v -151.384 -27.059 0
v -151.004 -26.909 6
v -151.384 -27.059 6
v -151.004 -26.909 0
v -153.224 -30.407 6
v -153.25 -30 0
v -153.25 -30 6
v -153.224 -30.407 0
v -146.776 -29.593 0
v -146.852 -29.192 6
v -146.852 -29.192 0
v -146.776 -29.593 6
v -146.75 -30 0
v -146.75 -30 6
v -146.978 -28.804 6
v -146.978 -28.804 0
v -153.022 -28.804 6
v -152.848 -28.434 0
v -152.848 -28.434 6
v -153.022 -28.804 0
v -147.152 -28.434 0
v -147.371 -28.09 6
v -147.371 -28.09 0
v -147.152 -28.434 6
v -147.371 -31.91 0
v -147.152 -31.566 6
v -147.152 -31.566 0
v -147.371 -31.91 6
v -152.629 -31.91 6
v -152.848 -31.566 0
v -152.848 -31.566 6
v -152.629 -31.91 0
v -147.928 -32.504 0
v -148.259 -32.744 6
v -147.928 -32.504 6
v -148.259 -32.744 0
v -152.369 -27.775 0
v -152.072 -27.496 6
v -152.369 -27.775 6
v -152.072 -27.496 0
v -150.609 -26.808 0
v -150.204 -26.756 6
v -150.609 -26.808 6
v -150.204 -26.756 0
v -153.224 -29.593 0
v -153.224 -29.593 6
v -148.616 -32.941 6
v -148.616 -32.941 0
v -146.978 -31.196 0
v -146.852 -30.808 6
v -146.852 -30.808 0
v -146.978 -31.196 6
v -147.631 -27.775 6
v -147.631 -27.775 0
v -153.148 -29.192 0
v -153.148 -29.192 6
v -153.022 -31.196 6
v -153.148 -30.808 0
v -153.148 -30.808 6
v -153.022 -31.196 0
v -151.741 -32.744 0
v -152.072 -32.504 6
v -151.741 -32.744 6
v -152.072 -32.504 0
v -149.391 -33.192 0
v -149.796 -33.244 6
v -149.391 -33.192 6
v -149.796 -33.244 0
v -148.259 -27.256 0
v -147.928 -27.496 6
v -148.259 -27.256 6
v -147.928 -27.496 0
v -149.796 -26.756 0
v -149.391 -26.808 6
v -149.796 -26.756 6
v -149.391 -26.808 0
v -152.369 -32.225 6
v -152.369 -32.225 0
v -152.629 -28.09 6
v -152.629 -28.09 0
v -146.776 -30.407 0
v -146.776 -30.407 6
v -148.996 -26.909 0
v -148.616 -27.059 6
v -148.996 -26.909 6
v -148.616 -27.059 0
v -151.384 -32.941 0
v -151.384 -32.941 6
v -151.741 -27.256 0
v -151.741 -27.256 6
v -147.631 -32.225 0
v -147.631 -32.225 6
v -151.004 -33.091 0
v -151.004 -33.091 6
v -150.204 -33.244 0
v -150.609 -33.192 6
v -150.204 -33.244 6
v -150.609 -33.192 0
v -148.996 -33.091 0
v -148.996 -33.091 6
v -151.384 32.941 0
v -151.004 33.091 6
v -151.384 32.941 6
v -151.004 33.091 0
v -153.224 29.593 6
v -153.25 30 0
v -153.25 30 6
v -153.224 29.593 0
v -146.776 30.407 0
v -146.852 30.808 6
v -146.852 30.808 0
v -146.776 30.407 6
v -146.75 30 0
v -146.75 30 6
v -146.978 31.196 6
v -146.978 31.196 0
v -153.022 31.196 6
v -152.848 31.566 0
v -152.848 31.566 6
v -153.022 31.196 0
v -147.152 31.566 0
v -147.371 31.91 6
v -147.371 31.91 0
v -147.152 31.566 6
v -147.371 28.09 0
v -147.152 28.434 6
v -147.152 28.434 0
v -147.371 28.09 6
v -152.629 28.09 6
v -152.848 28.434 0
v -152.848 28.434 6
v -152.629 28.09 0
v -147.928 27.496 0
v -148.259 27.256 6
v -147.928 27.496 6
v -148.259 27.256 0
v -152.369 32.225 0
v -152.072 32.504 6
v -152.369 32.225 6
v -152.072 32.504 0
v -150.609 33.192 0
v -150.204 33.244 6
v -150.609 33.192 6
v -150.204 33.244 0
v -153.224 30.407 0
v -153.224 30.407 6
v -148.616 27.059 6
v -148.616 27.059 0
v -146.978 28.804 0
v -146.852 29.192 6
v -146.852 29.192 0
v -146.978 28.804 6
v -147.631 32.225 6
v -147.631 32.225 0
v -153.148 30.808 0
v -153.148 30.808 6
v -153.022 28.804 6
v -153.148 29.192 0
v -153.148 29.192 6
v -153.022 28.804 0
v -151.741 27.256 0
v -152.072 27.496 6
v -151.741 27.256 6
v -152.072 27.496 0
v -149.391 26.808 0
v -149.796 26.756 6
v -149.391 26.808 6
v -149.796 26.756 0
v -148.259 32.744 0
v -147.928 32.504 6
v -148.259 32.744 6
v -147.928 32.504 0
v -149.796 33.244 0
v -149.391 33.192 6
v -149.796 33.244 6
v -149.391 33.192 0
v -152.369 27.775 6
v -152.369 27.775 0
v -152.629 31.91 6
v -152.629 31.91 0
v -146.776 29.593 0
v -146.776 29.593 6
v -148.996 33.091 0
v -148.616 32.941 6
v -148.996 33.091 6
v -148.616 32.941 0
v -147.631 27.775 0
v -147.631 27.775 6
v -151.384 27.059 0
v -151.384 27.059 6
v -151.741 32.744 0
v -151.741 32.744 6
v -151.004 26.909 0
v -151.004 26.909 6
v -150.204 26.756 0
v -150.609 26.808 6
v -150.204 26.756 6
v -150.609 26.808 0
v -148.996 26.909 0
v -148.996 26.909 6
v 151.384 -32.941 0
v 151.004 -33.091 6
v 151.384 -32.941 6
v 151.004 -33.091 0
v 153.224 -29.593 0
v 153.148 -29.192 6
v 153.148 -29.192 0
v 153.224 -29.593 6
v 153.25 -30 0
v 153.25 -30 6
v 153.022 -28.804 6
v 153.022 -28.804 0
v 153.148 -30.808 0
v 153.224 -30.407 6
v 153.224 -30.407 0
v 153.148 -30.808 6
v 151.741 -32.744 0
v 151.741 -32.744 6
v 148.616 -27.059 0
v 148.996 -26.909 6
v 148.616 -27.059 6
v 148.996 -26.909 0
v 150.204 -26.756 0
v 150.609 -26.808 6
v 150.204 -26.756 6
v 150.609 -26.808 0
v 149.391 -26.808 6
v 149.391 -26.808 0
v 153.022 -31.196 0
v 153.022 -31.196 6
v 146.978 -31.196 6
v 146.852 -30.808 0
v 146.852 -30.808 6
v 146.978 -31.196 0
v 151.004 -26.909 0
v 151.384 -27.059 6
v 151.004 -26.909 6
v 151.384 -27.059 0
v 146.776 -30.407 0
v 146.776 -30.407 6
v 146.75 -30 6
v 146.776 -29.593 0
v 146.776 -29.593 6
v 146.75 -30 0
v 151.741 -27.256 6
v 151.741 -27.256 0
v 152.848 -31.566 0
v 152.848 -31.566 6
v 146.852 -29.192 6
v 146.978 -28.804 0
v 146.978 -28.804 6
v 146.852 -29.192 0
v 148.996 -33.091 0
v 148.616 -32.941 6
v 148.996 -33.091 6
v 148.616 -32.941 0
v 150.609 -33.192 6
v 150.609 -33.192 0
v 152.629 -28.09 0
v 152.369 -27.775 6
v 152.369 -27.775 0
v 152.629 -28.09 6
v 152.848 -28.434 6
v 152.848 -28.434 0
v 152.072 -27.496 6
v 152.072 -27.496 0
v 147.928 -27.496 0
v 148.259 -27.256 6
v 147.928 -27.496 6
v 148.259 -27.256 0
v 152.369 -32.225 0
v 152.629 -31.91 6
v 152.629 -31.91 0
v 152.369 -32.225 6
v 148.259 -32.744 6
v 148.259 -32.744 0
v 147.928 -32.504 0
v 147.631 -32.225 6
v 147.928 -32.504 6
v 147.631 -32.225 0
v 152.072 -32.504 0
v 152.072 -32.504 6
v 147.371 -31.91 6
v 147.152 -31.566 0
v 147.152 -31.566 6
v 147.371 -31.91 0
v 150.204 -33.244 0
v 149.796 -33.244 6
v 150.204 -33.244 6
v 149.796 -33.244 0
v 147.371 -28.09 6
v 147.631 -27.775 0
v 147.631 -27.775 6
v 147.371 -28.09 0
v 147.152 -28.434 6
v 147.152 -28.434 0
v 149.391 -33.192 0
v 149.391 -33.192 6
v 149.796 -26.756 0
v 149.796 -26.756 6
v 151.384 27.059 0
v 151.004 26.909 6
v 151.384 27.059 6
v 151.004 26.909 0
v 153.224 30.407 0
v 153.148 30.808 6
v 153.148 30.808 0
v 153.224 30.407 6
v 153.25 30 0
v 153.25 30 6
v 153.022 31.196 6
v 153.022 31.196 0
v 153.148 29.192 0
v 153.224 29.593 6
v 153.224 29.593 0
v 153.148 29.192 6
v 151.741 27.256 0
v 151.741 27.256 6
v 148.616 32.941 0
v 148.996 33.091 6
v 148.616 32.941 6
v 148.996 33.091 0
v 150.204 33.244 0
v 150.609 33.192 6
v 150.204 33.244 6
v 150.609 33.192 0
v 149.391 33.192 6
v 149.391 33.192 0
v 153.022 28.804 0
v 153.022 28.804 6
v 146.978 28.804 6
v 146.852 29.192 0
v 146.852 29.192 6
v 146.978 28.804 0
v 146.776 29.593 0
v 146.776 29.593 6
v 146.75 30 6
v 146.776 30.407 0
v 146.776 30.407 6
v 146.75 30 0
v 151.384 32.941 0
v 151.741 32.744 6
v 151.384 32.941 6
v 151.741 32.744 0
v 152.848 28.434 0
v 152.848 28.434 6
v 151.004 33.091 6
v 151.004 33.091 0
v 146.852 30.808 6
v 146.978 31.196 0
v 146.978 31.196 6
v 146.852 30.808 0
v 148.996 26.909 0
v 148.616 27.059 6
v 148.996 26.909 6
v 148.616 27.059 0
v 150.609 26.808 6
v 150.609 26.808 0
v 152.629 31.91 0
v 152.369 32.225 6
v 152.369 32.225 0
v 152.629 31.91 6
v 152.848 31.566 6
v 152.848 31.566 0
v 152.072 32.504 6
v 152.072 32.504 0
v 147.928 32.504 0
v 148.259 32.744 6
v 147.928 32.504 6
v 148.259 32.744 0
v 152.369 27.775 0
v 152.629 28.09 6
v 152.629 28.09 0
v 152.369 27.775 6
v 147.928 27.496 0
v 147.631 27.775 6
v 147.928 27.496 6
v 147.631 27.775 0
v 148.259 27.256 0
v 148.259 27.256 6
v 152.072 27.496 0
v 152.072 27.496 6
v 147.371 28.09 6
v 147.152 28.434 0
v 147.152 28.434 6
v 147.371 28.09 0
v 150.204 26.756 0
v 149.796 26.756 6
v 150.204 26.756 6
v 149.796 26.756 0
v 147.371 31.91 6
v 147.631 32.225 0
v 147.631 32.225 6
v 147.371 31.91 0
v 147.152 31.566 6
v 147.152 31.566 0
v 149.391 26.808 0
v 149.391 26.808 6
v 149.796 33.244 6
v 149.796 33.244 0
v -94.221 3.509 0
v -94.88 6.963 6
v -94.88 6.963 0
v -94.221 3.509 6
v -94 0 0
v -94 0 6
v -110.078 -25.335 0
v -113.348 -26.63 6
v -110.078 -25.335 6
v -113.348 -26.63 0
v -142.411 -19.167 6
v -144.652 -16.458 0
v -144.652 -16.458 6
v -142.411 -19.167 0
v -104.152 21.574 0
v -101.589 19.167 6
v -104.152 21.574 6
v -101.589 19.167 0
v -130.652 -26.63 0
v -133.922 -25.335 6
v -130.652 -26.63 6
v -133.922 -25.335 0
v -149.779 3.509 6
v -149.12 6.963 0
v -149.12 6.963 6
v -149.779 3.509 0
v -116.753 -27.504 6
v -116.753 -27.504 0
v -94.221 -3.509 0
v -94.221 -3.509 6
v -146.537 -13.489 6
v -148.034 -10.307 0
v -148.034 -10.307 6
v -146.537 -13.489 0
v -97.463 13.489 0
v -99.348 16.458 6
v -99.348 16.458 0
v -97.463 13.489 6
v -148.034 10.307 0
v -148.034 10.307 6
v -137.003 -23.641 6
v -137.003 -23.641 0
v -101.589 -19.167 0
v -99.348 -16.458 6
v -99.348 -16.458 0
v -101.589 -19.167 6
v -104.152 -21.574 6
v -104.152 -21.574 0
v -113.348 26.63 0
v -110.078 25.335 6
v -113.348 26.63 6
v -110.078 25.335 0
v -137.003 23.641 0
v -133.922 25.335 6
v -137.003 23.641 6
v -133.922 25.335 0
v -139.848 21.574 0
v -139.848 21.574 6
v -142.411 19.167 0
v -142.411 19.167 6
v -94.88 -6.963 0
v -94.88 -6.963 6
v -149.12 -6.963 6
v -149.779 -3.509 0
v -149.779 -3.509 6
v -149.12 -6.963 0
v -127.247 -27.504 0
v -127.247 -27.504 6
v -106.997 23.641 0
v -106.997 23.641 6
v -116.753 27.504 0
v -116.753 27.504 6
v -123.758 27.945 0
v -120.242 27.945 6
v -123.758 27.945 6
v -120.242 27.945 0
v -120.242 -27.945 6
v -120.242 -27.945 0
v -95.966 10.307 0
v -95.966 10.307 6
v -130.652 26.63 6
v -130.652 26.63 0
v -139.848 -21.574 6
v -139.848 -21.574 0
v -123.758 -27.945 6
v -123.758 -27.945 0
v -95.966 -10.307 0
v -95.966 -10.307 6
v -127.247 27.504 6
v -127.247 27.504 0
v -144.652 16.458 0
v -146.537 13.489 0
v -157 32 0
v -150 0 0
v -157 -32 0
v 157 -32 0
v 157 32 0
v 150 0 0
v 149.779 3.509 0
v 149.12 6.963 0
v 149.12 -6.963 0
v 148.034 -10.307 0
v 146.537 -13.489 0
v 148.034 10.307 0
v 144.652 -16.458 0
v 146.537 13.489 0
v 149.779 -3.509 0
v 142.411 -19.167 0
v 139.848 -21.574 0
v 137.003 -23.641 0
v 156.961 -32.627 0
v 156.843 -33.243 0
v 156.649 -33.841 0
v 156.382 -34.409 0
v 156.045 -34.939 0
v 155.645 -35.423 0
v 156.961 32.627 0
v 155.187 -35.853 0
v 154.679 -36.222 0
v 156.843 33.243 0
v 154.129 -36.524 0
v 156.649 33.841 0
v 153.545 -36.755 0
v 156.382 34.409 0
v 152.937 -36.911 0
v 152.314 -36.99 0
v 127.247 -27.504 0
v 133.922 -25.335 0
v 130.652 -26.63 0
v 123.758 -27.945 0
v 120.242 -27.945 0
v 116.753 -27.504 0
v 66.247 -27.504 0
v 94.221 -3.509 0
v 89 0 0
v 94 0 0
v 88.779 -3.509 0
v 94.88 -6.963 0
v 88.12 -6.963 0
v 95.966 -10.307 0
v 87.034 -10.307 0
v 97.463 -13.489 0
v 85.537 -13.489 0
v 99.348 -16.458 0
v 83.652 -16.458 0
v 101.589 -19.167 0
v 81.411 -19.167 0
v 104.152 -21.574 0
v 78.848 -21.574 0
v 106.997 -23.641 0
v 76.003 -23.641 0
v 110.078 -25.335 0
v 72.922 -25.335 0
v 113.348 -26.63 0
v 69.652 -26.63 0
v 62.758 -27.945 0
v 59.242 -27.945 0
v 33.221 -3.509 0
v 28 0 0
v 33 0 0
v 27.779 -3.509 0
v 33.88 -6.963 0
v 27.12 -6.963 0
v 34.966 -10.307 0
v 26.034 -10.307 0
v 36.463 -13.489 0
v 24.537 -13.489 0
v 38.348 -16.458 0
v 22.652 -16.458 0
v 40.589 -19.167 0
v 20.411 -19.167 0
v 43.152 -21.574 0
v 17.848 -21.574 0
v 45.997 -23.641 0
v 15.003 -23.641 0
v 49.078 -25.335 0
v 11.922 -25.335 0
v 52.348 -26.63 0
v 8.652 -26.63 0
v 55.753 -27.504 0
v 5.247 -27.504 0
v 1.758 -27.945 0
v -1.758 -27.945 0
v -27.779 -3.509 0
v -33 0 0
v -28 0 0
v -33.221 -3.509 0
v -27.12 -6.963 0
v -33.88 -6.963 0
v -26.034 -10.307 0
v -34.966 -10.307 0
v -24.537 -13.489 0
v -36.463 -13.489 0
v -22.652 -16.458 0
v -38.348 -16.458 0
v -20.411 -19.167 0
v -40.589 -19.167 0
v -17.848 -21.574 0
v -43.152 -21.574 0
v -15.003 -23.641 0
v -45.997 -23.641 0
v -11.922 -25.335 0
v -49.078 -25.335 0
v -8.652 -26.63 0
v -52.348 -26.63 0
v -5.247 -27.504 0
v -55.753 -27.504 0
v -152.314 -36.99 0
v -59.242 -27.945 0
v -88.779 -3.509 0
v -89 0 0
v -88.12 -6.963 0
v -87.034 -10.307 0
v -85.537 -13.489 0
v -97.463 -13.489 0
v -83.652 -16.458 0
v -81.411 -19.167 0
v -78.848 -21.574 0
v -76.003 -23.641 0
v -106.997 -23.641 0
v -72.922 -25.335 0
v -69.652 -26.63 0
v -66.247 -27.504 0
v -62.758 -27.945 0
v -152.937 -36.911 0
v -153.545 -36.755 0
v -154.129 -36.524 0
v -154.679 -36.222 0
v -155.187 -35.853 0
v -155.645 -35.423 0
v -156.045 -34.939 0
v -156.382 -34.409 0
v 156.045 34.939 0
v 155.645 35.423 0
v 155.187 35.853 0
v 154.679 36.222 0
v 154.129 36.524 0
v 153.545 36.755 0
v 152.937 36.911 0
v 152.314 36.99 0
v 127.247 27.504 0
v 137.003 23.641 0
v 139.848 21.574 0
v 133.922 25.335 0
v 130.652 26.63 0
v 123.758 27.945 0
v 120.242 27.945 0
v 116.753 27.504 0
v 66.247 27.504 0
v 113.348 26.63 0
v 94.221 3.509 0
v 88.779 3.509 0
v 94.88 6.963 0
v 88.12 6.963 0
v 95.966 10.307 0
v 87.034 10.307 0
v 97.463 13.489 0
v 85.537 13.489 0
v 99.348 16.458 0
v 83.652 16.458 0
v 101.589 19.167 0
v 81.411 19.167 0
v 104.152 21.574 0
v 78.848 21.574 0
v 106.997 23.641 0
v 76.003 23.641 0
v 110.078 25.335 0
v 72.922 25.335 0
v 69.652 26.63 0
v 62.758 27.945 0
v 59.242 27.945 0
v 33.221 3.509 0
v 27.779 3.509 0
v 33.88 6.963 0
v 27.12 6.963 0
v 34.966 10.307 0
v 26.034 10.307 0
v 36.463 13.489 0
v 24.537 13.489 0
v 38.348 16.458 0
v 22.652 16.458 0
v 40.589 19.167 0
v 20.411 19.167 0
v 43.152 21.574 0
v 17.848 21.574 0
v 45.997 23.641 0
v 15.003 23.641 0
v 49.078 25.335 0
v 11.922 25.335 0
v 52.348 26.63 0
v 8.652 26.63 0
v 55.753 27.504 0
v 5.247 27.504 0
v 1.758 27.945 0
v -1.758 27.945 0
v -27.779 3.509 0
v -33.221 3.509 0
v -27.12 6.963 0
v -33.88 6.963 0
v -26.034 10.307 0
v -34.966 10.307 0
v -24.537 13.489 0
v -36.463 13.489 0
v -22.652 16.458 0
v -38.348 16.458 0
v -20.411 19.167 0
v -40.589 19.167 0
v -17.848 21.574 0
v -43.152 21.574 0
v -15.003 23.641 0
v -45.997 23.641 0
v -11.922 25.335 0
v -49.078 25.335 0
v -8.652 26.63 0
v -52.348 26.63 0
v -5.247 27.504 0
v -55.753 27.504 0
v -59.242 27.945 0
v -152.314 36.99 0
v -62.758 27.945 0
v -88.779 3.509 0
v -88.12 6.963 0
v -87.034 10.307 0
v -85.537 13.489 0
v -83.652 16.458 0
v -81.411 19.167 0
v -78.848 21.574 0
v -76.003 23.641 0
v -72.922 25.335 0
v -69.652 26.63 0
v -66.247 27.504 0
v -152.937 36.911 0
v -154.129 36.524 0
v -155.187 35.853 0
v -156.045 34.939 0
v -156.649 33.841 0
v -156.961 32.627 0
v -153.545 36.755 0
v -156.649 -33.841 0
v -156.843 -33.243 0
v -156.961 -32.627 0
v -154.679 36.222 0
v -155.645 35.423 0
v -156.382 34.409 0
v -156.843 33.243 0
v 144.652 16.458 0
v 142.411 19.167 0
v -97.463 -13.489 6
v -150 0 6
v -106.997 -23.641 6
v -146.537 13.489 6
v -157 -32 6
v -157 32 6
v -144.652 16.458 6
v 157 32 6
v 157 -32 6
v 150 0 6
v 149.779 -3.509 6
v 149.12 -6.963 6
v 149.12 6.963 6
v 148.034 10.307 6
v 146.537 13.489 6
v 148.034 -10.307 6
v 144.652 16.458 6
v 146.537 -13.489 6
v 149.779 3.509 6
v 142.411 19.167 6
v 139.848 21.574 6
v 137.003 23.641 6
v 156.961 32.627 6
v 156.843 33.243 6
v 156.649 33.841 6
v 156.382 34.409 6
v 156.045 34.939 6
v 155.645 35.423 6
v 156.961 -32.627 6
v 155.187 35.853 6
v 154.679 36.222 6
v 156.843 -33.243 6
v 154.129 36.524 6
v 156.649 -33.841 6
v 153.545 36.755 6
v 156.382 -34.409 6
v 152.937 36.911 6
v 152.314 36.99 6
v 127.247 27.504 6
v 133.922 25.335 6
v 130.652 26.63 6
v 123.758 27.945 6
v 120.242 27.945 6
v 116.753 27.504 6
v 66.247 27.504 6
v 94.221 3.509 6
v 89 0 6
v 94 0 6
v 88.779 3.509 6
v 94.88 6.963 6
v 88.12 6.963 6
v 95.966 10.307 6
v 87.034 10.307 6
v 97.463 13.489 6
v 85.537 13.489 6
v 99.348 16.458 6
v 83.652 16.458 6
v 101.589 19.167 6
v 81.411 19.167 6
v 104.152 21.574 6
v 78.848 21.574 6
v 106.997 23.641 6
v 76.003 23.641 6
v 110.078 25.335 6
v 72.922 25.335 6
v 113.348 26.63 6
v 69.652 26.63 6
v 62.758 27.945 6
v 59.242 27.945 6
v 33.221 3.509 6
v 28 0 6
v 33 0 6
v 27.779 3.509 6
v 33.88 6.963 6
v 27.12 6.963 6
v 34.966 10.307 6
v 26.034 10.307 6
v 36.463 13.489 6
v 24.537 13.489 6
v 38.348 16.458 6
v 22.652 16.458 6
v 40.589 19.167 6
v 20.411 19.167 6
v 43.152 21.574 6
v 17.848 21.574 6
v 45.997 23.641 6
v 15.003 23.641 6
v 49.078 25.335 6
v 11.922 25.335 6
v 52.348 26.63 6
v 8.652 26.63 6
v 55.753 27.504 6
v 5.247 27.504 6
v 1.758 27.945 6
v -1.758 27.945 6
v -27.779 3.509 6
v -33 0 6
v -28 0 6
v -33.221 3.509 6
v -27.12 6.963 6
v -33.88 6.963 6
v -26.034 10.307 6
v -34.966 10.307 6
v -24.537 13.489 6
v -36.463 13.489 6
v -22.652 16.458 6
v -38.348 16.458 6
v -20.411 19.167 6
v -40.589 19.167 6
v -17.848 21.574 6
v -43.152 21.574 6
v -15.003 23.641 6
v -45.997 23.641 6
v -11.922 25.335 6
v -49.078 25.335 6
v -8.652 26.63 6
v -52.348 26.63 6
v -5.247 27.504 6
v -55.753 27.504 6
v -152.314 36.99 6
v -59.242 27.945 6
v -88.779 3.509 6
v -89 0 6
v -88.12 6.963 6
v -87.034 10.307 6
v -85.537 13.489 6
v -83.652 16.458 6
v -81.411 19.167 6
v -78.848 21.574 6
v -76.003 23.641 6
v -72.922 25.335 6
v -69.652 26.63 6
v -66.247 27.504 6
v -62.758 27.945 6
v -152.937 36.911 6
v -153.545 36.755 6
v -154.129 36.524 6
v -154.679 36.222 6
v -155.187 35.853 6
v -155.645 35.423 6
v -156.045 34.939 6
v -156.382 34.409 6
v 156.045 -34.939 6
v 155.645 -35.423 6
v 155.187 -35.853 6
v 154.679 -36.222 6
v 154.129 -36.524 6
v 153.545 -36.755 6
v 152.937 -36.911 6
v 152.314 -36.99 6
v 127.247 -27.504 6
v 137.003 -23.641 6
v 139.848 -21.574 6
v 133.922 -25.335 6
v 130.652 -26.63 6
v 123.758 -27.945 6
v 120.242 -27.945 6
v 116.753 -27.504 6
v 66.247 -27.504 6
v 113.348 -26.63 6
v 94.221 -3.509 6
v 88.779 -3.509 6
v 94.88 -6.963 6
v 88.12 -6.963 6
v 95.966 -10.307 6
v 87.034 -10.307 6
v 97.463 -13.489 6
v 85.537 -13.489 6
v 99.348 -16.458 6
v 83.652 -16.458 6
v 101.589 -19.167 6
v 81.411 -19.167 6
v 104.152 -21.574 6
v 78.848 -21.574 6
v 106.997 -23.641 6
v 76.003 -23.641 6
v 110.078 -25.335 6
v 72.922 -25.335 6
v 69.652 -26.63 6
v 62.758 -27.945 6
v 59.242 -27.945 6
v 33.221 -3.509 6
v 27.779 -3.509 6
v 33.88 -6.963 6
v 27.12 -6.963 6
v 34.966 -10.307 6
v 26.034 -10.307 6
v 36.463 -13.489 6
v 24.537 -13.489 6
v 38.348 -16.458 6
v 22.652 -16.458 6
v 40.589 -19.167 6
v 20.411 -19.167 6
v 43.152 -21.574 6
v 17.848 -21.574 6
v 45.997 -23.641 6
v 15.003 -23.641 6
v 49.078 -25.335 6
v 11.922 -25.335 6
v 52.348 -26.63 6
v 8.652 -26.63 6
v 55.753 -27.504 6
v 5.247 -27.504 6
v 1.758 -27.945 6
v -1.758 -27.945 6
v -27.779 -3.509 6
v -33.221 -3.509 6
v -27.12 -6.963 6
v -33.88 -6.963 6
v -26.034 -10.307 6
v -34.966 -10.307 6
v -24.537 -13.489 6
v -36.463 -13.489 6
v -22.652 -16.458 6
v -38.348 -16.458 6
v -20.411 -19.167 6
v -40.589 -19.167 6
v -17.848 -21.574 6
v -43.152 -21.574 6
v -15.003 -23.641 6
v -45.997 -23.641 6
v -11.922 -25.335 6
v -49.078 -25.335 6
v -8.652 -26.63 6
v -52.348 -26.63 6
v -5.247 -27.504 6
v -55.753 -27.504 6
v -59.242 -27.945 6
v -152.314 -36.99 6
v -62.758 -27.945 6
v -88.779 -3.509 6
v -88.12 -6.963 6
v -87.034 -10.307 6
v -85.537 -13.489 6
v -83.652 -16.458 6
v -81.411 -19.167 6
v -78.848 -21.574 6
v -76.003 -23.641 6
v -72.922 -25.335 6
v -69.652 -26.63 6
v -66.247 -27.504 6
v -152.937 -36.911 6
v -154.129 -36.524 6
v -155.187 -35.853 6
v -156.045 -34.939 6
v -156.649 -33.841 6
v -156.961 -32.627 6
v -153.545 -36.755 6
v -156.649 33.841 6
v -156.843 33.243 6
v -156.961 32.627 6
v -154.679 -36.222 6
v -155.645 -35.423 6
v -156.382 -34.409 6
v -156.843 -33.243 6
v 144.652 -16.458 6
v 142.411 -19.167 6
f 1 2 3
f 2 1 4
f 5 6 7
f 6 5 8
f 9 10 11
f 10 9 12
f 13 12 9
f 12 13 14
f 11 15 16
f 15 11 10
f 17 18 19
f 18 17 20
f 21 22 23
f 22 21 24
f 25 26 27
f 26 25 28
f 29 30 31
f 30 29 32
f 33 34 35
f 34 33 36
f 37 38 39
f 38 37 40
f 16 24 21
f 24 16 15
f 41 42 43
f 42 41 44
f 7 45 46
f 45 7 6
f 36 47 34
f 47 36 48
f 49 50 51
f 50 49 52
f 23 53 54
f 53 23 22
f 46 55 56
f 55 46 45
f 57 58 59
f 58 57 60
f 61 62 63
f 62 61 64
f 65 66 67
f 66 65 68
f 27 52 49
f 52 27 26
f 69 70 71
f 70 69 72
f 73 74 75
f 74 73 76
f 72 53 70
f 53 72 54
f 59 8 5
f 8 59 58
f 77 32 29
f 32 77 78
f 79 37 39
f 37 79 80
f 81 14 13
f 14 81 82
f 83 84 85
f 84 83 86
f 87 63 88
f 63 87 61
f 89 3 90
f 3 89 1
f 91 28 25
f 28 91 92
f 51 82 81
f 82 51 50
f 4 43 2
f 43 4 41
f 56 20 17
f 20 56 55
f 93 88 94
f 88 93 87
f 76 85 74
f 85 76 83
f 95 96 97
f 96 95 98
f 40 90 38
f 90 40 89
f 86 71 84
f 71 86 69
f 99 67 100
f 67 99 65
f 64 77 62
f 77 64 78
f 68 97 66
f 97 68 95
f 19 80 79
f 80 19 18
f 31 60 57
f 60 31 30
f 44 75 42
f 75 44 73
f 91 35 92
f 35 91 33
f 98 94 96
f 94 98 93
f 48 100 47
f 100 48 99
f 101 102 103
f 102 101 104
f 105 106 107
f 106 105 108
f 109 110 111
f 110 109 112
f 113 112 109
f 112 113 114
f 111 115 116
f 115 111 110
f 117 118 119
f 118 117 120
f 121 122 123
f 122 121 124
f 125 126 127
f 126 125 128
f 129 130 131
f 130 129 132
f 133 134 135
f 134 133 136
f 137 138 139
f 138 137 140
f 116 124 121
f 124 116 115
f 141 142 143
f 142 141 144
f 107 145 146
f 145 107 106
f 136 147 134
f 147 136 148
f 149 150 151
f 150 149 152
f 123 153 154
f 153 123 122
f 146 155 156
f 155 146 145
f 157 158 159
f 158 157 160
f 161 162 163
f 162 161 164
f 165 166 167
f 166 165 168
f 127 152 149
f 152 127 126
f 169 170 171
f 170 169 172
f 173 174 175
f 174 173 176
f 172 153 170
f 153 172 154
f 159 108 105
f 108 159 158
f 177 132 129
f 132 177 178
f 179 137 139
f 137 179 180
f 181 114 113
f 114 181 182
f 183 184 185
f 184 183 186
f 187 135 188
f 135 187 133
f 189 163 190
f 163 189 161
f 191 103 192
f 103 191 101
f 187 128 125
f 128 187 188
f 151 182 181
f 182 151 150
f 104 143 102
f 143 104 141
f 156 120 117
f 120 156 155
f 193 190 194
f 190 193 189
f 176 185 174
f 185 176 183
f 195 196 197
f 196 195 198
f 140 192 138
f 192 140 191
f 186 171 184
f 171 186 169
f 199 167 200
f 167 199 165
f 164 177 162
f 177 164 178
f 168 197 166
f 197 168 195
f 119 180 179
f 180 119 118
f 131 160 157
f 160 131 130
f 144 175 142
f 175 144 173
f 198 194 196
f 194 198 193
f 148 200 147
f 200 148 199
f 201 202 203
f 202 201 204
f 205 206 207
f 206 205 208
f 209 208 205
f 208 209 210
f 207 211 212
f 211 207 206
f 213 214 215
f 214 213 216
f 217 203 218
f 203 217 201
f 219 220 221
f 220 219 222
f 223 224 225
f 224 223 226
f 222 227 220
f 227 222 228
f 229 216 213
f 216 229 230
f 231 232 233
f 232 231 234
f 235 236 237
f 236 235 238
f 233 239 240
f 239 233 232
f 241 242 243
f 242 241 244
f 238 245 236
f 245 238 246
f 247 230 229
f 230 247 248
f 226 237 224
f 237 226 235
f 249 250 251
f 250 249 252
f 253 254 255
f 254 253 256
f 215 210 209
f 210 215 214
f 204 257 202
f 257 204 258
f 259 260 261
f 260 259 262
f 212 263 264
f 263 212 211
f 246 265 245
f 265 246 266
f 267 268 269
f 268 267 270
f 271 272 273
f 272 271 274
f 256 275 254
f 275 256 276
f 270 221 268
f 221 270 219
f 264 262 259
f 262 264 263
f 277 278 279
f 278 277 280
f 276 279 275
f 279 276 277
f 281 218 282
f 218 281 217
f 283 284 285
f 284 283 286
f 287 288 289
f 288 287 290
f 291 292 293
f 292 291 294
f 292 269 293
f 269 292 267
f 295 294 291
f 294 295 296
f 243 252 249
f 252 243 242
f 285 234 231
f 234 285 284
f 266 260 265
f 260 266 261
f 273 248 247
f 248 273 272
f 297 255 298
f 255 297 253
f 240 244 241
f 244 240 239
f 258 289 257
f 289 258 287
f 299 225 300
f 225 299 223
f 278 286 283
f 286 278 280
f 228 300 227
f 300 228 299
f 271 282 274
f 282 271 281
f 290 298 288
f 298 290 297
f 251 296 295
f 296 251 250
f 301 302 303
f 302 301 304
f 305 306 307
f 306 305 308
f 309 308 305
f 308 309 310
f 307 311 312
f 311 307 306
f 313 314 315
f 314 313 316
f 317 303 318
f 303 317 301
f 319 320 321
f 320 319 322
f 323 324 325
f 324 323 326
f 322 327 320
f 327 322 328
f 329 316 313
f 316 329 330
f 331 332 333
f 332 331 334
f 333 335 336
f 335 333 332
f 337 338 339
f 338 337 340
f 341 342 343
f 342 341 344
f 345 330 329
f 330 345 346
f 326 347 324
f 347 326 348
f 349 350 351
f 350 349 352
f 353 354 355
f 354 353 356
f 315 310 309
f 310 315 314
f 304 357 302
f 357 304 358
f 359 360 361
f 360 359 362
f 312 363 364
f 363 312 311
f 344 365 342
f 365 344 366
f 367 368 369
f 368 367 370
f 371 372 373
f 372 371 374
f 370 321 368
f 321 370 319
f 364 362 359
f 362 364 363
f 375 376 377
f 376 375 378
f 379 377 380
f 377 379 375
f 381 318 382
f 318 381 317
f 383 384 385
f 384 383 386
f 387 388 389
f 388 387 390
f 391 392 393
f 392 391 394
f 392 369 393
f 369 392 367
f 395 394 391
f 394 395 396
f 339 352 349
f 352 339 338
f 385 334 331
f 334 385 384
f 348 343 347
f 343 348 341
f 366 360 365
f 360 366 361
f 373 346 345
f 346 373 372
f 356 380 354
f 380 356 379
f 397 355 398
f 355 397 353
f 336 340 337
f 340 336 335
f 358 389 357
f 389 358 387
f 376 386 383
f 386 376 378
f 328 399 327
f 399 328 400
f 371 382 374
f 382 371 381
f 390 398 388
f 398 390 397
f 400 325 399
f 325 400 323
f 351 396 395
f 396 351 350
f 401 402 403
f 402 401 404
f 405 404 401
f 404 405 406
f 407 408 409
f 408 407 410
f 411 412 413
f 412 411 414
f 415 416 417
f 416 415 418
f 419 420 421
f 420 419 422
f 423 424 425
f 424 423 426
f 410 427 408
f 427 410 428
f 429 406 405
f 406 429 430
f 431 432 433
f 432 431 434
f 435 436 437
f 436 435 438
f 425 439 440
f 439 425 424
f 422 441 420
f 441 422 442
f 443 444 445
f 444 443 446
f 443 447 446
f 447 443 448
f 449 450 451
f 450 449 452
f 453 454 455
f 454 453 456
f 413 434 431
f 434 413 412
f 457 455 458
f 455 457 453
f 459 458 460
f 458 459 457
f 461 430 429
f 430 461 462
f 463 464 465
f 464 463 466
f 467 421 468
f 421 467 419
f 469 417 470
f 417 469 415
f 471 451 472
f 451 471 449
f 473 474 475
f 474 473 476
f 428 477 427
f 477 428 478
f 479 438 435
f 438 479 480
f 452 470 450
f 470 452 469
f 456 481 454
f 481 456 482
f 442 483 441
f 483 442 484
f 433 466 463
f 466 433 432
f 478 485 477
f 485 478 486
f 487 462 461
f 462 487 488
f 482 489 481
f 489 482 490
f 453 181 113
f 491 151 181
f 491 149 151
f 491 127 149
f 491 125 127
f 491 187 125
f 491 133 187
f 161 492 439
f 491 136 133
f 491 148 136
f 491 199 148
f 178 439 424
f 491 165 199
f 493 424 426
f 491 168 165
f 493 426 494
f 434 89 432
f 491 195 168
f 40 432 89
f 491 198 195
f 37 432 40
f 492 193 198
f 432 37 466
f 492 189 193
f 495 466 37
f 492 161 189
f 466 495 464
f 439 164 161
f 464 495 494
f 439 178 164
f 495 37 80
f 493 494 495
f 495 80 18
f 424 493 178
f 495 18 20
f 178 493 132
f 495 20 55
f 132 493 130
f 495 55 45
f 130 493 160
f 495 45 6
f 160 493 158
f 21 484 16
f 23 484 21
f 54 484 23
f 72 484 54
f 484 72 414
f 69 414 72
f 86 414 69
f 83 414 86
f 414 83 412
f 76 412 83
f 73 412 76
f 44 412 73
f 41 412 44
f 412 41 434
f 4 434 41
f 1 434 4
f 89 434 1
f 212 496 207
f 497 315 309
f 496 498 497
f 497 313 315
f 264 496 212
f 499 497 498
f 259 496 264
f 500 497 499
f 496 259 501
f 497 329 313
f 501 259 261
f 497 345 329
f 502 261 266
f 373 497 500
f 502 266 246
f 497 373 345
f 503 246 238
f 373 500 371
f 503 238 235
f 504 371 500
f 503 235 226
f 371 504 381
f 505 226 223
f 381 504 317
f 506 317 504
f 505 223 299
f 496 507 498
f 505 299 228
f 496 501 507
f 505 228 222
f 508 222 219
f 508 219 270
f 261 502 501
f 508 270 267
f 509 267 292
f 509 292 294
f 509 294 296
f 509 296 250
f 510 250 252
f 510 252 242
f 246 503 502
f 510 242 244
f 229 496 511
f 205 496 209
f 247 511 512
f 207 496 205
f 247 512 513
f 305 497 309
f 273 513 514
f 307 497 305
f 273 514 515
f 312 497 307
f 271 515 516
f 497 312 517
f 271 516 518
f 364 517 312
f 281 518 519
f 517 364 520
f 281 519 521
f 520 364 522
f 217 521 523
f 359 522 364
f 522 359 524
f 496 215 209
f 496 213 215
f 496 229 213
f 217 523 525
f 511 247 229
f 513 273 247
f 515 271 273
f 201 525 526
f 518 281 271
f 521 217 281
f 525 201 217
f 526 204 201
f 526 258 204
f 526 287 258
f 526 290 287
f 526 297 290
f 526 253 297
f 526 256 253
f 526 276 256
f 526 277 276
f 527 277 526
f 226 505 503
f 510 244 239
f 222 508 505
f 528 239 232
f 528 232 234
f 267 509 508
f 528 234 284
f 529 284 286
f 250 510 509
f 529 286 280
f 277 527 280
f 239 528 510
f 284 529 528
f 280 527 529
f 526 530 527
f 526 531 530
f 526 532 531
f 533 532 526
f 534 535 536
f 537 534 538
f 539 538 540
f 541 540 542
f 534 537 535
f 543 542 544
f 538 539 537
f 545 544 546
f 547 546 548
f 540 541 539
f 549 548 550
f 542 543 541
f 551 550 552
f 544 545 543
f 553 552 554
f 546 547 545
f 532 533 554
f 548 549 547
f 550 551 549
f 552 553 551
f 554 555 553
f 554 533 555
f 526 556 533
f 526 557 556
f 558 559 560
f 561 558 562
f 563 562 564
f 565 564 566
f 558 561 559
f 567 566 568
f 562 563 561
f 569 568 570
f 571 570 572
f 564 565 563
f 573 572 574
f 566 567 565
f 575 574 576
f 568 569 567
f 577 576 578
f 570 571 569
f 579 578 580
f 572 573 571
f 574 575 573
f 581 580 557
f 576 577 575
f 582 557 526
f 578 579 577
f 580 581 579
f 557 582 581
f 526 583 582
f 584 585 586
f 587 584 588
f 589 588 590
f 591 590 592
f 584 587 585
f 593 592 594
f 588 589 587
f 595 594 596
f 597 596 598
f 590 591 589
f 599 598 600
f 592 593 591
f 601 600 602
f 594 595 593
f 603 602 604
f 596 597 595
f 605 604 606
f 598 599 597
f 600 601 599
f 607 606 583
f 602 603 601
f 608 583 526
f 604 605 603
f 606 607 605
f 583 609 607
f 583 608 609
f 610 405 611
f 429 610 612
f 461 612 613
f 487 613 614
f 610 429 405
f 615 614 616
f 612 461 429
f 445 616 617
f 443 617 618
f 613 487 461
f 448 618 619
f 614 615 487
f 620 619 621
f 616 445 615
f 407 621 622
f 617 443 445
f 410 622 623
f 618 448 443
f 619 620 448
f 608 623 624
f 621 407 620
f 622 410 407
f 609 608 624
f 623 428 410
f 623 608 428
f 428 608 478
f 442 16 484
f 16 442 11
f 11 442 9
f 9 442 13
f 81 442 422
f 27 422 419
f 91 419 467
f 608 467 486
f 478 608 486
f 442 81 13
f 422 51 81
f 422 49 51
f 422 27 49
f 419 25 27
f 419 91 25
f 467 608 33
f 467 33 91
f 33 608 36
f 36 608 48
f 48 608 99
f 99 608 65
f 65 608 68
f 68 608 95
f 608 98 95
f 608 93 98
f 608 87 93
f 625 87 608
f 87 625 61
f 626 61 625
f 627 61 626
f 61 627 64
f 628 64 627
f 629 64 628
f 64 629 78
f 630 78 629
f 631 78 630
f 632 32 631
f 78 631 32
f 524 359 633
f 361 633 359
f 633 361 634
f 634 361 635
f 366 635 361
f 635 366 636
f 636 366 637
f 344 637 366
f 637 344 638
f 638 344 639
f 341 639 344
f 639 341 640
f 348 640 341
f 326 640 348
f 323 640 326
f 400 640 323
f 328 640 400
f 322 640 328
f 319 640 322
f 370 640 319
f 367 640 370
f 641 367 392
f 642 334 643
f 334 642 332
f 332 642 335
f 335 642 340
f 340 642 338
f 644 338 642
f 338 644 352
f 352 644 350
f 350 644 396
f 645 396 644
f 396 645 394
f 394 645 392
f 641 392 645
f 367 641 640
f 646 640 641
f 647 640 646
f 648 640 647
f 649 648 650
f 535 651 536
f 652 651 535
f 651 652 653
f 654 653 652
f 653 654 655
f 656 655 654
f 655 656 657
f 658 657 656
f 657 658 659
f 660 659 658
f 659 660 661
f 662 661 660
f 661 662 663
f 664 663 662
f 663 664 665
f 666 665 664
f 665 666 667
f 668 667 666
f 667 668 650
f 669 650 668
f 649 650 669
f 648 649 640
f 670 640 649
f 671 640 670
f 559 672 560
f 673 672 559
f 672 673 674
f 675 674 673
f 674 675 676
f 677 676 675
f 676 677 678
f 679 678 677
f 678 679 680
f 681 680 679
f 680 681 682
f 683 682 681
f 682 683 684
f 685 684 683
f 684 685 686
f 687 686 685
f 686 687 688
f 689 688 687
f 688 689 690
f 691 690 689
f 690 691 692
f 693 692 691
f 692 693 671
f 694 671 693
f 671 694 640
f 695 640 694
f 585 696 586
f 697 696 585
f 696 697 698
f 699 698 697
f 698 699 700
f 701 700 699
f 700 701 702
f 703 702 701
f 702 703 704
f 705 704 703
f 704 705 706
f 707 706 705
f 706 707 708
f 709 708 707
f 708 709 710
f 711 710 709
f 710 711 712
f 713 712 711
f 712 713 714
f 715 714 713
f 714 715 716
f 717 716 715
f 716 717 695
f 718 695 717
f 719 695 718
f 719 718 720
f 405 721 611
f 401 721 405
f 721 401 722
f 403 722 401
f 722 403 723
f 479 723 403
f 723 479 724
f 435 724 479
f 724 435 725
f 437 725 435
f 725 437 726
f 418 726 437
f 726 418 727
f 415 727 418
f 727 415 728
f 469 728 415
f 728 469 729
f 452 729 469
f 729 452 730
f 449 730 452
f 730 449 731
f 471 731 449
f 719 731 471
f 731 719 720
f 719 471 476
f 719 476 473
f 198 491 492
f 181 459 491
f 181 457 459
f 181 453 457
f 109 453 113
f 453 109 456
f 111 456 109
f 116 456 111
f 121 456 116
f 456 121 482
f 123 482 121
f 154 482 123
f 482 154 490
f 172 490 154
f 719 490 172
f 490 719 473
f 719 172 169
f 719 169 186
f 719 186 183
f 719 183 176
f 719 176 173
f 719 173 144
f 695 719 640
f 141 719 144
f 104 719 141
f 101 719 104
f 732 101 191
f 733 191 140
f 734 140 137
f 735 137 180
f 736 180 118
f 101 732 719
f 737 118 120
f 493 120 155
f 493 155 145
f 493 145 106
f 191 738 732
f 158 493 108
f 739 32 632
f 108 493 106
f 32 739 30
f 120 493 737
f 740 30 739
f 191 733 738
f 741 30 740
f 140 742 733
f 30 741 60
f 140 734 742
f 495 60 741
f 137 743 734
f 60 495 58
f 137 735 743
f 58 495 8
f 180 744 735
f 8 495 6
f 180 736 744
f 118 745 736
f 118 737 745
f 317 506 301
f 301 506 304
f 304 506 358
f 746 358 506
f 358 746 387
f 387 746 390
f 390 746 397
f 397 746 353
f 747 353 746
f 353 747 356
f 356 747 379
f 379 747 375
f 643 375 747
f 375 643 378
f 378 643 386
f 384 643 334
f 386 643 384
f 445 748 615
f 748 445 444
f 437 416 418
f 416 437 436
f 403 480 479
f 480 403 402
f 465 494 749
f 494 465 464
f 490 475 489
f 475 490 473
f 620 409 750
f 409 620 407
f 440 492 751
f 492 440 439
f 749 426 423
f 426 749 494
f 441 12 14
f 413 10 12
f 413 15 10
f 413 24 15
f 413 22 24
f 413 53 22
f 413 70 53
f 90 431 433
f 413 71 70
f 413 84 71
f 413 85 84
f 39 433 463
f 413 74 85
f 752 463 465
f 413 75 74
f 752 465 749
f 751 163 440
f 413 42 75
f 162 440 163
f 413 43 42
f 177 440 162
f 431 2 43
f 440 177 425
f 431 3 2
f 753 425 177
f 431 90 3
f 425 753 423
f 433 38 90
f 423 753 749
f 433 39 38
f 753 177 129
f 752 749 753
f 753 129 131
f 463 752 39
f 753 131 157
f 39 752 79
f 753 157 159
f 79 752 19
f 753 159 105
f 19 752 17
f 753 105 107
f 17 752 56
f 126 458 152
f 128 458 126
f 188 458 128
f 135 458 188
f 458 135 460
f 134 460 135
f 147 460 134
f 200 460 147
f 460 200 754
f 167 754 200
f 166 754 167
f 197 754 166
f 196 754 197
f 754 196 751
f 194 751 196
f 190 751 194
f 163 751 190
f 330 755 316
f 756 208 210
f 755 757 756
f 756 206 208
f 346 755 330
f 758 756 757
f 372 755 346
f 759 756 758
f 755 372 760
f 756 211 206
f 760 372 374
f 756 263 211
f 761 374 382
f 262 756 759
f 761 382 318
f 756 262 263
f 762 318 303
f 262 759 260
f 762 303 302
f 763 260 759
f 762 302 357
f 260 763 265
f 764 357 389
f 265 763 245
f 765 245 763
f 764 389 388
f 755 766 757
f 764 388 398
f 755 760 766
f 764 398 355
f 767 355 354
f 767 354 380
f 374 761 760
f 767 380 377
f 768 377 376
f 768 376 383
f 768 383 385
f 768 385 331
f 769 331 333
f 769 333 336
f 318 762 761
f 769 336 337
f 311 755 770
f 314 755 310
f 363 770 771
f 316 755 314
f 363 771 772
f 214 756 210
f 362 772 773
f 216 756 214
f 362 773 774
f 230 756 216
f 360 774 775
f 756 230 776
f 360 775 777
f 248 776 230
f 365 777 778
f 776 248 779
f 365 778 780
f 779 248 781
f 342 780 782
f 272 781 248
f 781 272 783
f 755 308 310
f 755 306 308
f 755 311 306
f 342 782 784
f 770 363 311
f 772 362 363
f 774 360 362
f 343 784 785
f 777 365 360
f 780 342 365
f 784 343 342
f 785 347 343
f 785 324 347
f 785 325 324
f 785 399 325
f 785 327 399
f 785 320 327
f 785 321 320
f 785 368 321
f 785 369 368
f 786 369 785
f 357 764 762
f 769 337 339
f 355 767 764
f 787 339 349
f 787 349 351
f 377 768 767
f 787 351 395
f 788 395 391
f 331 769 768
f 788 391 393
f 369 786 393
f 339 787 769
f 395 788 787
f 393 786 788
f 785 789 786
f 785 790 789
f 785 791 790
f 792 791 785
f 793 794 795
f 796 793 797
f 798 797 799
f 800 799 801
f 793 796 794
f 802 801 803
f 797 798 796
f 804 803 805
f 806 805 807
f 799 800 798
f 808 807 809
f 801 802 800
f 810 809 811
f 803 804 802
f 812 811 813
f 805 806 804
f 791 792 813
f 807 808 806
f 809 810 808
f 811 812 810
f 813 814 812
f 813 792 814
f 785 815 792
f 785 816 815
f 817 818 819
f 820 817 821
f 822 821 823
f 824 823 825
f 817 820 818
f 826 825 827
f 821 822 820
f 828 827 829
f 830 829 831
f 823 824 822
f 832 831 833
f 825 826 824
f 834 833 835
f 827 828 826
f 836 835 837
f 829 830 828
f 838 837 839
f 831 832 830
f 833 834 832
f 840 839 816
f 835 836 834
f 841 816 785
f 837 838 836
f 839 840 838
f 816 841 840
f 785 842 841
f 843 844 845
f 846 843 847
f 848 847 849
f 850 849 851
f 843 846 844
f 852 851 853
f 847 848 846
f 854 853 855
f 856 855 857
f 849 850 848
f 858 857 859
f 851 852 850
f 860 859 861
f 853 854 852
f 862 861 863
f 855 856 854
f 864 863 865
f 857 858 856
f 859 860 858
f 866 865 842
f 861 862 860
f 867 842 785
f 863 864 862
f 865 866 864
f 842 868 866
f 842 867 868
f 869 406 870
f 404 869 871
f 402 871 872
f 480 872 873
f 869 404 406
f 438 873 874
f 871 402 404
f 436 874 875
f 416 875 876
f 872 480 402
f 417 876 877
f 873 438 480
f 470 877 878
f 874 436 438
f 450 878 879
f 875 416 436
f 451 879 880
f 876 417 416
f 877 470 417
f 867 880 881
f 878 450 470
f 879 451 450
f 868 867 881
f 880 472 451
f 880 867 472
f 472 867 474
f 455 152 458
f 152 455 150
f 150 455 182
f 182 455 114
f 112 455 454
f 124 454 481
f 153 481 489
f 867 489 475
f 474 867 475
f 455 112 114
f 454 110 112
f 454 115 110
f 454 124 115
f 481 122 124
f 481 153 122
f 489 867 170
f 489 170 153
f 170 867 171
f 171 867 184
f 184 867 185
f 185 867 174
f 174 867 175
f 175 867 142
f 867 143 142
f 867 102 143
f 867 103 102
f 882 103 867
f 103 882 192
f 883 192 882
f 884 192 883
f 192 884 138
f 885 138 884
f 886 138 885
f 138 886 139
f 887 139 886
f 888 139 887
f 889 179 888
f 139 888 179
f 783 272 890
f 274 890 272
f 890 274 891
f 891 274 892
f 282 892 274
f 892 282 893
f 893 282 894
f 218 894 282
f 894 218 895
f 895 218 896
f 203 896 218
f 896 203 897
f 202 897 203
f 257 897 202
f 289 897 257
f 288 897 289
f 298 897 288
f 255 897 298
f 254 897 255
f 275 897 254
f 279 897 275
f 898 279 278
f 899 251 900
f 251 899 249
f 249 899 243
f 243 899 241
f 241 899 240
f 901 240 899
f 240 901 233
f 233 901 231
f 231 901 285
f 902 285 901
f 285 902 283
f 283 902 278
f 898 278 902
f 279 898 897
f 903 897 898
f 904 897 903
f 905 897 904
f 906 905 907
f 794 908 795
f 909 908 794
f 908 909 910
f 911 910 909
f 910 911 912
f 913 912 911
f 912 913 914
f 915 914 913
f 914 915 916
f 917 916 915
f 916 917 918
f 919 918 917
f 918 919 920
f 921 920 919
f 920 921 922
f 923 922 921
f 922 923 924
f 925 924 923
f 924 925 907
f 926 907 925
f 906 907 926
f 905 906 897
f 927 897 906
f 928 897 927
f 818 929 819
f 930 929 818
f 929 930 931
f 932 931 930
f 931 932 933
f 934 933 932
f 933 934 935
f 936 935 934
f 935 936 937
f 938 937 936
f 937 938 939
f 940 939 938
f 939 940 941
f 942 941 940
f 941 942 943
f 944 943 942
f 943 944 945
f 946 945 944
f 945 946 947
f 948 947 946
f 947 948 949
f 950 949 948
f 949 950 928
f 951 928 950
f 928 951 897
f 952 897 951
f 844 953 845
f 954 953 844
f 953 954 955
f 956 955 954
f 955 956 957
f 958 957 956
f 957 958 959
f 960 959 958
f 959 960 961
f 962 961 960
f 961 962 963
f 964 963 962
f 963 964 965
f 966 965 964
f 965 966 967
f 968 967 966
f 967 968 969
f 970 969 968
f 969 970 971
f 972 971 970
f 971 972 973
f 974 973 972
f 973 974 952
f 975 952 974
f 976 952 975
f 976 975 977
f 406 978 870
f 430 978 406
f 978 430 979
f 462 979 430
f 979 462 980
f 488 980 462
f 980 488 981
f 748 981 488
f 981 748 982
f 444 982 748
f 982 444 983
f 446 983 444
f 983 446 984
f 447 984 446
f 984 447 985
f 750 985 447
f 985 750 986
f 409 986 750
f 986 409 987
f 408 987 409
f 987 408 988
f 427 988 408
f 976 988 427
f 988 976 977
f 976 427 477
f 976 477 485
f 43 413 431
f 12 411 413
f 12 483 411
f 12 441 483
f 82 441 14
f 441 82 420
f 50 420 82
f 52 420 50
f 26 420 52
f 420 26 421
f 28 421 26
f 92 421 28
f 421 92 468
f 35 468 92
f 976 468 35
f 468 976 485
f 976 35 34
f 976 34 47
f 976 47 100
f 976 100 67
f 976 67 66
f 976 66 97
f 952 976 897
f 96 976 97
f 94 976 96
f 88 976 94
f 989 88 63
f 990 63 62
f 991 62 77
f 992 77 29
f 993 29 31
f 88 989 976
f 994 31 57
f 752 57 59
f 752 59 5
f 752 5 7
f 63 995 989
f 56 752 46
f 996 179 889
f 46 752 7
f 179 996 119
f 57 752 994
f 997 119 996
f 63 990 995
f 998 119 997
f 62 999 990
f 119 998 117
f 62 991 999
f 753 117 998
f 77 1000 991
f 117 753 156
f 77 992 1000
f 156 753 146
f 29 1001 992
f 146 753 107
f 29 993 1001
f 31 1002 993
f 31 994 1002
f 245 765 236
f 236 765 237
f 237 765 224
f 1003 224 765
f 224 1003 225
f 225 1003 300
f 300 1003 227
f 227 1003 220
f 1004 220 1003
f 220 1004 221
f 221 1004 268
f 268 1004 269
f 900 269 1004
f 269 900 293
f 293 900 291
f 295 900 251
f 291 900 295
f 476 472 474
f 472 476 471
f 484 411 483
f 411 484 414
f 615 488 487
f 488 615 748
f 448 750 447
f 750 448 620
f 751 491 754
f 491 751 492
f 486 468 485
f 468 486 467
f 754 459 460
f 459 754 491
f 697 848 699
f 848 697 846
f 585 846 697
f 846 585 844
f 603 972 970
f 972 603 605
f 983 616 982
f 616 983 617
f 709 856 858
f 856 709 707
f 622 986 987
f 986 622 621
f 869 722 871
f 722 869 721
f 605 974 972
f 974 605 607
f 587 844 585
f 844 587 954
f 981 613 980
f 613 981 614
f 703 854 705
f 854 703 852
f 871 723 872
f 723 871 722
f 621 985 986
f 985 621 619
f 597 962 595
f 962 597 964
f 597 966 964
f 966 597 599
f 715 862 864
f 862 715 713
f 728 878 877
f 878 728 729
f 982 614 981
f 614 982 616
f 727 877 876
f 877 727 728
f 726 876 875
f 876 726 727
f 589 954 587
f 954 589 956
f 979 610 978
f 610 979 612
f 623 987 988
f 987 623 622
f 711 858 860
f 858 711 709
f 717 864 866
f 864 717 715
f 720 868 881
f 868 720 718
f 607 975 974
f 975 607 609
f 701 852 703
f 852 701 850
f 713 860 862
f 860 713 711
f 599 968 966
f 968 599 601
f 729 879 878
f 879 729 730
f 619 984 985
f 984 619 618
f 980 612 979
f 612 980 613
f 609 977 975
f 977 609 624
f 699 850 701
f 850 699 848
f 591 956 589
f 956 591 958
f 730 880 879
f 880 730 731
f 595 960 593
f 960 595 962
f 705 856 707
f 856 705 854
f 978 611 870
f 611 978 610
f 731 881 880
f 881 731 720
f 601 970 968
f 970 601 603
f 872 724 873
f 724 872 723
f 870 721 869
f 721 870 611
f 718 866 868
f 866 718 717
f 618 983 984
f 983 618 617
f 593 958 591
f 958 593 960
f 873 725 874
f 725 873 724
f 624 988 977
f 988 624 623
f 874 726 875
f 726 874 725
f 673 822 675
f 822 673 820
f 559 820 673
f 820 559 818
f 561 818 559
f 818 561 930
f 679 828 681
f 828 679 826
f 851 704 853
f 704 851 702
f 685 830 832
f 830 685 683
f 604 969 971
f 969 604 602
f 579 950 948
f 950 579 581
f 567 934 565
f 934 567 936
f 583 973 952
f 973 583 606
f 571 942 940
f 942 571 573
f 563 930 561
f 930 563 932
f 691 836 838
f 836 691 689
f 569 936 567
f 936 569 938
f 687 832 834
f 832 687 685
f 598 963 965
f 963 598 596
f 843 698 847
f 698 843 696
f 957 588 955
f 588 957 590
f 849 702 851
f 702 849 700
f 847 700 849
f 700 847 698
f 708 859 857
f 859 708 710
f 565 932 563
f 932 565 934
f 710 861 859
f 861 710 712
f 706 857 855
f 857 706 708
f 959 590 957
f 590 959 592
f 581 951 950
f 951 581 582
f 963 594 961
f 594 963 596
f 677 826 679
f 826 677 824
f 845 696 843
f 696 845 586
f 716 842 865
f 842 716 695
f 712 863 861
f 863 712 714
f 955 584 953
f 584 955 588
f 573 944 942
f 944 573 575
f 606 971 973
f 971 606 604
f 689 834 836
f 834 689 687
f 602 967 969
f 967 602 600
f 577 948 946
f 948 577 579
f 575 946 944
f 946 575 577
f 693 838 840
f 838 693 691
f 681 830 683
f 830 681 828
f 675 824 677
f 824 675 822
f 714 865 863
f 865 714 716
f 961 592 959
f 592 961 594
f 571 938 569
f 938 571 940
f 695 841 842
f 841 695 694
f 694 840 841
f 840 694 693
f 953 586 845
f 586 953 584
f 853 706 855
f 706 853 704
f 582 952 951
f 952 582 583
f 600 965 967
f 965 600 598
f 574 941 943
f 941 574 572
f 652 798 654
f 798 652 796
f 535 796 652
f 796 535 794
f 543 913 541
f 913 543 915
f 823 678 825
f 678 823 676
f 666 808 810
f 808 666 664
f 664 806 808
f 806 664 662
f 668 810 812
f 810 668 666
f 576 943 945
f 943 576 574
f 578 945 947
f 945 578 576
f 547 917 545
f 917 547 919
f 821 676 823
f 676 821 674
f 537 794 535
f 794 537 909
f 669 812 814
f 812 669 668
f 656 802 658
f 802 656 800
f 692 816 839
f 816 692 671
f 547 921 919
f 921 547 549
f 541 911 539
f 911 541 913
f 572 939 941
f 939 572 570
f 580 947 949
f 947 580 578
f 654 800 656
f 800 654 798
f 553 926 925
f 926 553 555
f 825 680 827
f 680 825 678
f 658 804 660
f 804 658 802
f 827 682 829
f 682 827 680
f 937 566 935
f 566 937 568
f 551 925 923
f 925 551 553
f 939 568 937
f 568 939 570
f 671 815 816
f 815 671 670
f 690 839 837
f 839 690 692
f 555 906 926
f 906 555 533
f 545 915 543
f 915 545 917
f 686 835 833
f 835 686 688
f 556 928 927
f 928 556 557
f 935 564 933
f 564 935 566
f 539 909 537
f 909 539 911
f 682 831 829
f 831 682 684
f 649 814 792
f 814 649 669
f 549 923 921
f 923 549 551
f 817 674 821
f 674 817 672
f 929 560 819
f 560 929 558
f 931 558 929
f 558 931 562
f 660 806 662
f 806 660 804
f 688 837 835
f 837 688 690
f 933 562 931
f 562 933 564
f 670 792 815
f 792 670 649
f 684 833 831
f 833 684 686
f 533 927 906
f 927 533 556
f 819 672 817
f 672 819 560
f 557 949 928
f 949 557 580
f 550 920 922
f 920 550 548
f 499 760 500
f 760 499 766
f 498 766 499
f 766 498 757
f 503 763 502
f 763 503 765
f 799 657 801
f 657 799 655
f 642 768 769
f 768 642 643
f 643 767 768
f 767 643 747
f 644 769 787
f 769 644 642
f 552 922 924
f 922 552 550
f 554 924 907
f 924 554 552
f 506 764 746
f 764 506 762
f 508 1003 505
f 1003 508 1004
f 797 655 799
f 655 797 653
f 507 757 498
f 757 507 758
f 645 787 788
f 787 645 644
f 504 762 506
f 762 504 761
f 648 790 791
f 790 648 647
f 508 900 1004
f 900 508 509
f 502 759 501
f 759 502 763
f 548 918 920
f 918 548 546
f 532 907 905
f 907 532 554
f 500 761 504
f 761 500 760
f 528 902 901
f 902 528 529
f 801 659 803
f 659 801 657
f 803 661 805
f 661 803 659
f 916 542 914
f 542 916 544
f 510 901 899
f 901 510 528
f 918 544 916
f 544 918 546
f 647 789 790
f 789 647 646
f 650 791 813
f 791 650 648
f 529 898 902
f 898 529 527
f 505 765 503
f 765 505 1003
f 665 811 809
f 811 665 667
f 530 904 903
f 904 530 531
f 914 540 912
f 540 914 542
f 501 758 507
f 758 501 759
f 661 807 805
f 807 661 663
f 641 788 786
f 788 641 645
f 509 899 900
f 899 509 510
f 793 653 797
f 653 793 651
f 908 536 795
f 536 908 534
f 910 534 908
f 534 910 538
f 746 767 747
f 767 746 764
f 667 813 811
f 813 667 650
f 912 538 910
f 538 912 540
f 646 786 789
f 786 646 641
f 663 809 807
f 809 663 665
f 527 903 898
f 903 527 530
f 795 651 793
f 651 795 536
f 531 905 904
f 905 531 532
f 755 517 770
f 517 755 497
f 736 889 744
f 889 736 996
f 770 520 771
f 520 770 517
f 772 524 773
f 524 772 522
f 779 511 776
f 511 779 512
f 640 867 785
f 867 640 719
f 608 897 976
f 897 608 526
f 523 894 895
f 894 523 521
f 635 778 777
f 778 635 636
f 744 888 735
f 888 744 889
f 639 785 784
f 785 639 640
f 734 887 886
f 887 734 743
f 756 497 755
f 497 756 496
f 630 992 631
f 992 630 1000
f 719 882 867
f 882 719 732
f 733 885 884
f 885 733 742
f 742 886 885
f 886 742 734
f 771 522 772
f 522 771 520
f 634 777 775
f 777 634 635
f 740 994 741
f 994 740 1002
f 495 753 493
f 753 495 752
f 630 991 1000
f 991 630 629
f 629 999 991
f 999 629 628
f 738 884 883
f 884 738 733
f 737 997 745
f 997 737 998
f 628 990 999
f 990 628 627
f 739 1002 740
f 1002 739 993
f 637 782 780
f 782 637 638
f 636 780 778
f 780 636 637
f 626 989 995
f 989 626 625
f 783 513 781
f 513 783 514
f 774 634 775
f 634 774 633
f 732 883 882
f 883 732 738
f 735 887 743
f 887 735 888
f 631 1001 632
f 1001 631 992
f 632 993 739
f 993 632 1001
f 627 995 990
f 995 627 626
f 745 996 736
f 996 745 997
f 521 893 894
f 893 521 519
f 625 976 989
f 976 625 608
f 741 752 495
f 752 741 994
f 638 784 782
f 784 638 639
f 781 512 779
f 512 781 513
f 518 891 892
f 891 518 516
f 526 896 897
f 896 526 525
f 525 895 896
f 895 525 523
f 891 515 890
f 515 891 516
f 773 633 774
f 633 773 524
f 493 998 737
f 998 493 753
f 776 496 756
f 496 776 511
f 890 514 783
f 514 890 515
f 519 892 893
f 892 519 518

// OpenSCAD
$fn = 50;


difference() {
	union() {
		hull() {
			translate(v = [-152.0000000000, 32.0000000000, 0]) {
				cylinder(h = 6, r = 5);
			}
			translate(v = [152.0000000000, 32.0000000000, 0]) {
				cylinder(h = 6, r = 5);
			}
			translate(v = [-152.0000000000, -32.0000000000, 0]) {
				cylinder(h = 6, r = 5);
			}
			translate(v = [152.0000000000, -32.0000000000, 0]) {
				cylinder(h = 6, r = 5);
			}
		}
	}
	union() {
		#translate(v = [-150.0000000000, -30.0000000000, -100.0000000000]) {
			cylinder(h = 200, r = 3.2500000000);
		}
		#translate(v = [-150.0000000000, 30.0000000000, -100.0000000000]) {
			cylinder(h = 200, r = 3.2500000000);
		}
		#translate(v = [150.0000000000, -30.0000000000, -100.0000000000]) {
			cylinder(h = 200, r = 3.2500000000);
		}
		#translate(v = [150.0000000000, 30.0000000000, -100.0000000000]) {
			cylinder(h = 200, r = 3.2500000000);
		}
		#translate(v = [-122.0000000000, 0, 0]) {
			cylinder(h = 6, r = 28.0000000000);
		}
		#translate(v = [-61.0000000000, 0, 0]) {
			cylinder(h = 6, r = 28.0000000000);
		}
		#cylinder(h = 6, r = 28.0000000000);
		#translate(v = [61.0000000000, 0, 0]) {
			cylinder(h = 6, r = 28.0000000000);
		}
		#translate(v = [122.0000000000, 0, 0]) {
			cylinder(h = 6, r = 28.0000000000);
		}
	}
}
